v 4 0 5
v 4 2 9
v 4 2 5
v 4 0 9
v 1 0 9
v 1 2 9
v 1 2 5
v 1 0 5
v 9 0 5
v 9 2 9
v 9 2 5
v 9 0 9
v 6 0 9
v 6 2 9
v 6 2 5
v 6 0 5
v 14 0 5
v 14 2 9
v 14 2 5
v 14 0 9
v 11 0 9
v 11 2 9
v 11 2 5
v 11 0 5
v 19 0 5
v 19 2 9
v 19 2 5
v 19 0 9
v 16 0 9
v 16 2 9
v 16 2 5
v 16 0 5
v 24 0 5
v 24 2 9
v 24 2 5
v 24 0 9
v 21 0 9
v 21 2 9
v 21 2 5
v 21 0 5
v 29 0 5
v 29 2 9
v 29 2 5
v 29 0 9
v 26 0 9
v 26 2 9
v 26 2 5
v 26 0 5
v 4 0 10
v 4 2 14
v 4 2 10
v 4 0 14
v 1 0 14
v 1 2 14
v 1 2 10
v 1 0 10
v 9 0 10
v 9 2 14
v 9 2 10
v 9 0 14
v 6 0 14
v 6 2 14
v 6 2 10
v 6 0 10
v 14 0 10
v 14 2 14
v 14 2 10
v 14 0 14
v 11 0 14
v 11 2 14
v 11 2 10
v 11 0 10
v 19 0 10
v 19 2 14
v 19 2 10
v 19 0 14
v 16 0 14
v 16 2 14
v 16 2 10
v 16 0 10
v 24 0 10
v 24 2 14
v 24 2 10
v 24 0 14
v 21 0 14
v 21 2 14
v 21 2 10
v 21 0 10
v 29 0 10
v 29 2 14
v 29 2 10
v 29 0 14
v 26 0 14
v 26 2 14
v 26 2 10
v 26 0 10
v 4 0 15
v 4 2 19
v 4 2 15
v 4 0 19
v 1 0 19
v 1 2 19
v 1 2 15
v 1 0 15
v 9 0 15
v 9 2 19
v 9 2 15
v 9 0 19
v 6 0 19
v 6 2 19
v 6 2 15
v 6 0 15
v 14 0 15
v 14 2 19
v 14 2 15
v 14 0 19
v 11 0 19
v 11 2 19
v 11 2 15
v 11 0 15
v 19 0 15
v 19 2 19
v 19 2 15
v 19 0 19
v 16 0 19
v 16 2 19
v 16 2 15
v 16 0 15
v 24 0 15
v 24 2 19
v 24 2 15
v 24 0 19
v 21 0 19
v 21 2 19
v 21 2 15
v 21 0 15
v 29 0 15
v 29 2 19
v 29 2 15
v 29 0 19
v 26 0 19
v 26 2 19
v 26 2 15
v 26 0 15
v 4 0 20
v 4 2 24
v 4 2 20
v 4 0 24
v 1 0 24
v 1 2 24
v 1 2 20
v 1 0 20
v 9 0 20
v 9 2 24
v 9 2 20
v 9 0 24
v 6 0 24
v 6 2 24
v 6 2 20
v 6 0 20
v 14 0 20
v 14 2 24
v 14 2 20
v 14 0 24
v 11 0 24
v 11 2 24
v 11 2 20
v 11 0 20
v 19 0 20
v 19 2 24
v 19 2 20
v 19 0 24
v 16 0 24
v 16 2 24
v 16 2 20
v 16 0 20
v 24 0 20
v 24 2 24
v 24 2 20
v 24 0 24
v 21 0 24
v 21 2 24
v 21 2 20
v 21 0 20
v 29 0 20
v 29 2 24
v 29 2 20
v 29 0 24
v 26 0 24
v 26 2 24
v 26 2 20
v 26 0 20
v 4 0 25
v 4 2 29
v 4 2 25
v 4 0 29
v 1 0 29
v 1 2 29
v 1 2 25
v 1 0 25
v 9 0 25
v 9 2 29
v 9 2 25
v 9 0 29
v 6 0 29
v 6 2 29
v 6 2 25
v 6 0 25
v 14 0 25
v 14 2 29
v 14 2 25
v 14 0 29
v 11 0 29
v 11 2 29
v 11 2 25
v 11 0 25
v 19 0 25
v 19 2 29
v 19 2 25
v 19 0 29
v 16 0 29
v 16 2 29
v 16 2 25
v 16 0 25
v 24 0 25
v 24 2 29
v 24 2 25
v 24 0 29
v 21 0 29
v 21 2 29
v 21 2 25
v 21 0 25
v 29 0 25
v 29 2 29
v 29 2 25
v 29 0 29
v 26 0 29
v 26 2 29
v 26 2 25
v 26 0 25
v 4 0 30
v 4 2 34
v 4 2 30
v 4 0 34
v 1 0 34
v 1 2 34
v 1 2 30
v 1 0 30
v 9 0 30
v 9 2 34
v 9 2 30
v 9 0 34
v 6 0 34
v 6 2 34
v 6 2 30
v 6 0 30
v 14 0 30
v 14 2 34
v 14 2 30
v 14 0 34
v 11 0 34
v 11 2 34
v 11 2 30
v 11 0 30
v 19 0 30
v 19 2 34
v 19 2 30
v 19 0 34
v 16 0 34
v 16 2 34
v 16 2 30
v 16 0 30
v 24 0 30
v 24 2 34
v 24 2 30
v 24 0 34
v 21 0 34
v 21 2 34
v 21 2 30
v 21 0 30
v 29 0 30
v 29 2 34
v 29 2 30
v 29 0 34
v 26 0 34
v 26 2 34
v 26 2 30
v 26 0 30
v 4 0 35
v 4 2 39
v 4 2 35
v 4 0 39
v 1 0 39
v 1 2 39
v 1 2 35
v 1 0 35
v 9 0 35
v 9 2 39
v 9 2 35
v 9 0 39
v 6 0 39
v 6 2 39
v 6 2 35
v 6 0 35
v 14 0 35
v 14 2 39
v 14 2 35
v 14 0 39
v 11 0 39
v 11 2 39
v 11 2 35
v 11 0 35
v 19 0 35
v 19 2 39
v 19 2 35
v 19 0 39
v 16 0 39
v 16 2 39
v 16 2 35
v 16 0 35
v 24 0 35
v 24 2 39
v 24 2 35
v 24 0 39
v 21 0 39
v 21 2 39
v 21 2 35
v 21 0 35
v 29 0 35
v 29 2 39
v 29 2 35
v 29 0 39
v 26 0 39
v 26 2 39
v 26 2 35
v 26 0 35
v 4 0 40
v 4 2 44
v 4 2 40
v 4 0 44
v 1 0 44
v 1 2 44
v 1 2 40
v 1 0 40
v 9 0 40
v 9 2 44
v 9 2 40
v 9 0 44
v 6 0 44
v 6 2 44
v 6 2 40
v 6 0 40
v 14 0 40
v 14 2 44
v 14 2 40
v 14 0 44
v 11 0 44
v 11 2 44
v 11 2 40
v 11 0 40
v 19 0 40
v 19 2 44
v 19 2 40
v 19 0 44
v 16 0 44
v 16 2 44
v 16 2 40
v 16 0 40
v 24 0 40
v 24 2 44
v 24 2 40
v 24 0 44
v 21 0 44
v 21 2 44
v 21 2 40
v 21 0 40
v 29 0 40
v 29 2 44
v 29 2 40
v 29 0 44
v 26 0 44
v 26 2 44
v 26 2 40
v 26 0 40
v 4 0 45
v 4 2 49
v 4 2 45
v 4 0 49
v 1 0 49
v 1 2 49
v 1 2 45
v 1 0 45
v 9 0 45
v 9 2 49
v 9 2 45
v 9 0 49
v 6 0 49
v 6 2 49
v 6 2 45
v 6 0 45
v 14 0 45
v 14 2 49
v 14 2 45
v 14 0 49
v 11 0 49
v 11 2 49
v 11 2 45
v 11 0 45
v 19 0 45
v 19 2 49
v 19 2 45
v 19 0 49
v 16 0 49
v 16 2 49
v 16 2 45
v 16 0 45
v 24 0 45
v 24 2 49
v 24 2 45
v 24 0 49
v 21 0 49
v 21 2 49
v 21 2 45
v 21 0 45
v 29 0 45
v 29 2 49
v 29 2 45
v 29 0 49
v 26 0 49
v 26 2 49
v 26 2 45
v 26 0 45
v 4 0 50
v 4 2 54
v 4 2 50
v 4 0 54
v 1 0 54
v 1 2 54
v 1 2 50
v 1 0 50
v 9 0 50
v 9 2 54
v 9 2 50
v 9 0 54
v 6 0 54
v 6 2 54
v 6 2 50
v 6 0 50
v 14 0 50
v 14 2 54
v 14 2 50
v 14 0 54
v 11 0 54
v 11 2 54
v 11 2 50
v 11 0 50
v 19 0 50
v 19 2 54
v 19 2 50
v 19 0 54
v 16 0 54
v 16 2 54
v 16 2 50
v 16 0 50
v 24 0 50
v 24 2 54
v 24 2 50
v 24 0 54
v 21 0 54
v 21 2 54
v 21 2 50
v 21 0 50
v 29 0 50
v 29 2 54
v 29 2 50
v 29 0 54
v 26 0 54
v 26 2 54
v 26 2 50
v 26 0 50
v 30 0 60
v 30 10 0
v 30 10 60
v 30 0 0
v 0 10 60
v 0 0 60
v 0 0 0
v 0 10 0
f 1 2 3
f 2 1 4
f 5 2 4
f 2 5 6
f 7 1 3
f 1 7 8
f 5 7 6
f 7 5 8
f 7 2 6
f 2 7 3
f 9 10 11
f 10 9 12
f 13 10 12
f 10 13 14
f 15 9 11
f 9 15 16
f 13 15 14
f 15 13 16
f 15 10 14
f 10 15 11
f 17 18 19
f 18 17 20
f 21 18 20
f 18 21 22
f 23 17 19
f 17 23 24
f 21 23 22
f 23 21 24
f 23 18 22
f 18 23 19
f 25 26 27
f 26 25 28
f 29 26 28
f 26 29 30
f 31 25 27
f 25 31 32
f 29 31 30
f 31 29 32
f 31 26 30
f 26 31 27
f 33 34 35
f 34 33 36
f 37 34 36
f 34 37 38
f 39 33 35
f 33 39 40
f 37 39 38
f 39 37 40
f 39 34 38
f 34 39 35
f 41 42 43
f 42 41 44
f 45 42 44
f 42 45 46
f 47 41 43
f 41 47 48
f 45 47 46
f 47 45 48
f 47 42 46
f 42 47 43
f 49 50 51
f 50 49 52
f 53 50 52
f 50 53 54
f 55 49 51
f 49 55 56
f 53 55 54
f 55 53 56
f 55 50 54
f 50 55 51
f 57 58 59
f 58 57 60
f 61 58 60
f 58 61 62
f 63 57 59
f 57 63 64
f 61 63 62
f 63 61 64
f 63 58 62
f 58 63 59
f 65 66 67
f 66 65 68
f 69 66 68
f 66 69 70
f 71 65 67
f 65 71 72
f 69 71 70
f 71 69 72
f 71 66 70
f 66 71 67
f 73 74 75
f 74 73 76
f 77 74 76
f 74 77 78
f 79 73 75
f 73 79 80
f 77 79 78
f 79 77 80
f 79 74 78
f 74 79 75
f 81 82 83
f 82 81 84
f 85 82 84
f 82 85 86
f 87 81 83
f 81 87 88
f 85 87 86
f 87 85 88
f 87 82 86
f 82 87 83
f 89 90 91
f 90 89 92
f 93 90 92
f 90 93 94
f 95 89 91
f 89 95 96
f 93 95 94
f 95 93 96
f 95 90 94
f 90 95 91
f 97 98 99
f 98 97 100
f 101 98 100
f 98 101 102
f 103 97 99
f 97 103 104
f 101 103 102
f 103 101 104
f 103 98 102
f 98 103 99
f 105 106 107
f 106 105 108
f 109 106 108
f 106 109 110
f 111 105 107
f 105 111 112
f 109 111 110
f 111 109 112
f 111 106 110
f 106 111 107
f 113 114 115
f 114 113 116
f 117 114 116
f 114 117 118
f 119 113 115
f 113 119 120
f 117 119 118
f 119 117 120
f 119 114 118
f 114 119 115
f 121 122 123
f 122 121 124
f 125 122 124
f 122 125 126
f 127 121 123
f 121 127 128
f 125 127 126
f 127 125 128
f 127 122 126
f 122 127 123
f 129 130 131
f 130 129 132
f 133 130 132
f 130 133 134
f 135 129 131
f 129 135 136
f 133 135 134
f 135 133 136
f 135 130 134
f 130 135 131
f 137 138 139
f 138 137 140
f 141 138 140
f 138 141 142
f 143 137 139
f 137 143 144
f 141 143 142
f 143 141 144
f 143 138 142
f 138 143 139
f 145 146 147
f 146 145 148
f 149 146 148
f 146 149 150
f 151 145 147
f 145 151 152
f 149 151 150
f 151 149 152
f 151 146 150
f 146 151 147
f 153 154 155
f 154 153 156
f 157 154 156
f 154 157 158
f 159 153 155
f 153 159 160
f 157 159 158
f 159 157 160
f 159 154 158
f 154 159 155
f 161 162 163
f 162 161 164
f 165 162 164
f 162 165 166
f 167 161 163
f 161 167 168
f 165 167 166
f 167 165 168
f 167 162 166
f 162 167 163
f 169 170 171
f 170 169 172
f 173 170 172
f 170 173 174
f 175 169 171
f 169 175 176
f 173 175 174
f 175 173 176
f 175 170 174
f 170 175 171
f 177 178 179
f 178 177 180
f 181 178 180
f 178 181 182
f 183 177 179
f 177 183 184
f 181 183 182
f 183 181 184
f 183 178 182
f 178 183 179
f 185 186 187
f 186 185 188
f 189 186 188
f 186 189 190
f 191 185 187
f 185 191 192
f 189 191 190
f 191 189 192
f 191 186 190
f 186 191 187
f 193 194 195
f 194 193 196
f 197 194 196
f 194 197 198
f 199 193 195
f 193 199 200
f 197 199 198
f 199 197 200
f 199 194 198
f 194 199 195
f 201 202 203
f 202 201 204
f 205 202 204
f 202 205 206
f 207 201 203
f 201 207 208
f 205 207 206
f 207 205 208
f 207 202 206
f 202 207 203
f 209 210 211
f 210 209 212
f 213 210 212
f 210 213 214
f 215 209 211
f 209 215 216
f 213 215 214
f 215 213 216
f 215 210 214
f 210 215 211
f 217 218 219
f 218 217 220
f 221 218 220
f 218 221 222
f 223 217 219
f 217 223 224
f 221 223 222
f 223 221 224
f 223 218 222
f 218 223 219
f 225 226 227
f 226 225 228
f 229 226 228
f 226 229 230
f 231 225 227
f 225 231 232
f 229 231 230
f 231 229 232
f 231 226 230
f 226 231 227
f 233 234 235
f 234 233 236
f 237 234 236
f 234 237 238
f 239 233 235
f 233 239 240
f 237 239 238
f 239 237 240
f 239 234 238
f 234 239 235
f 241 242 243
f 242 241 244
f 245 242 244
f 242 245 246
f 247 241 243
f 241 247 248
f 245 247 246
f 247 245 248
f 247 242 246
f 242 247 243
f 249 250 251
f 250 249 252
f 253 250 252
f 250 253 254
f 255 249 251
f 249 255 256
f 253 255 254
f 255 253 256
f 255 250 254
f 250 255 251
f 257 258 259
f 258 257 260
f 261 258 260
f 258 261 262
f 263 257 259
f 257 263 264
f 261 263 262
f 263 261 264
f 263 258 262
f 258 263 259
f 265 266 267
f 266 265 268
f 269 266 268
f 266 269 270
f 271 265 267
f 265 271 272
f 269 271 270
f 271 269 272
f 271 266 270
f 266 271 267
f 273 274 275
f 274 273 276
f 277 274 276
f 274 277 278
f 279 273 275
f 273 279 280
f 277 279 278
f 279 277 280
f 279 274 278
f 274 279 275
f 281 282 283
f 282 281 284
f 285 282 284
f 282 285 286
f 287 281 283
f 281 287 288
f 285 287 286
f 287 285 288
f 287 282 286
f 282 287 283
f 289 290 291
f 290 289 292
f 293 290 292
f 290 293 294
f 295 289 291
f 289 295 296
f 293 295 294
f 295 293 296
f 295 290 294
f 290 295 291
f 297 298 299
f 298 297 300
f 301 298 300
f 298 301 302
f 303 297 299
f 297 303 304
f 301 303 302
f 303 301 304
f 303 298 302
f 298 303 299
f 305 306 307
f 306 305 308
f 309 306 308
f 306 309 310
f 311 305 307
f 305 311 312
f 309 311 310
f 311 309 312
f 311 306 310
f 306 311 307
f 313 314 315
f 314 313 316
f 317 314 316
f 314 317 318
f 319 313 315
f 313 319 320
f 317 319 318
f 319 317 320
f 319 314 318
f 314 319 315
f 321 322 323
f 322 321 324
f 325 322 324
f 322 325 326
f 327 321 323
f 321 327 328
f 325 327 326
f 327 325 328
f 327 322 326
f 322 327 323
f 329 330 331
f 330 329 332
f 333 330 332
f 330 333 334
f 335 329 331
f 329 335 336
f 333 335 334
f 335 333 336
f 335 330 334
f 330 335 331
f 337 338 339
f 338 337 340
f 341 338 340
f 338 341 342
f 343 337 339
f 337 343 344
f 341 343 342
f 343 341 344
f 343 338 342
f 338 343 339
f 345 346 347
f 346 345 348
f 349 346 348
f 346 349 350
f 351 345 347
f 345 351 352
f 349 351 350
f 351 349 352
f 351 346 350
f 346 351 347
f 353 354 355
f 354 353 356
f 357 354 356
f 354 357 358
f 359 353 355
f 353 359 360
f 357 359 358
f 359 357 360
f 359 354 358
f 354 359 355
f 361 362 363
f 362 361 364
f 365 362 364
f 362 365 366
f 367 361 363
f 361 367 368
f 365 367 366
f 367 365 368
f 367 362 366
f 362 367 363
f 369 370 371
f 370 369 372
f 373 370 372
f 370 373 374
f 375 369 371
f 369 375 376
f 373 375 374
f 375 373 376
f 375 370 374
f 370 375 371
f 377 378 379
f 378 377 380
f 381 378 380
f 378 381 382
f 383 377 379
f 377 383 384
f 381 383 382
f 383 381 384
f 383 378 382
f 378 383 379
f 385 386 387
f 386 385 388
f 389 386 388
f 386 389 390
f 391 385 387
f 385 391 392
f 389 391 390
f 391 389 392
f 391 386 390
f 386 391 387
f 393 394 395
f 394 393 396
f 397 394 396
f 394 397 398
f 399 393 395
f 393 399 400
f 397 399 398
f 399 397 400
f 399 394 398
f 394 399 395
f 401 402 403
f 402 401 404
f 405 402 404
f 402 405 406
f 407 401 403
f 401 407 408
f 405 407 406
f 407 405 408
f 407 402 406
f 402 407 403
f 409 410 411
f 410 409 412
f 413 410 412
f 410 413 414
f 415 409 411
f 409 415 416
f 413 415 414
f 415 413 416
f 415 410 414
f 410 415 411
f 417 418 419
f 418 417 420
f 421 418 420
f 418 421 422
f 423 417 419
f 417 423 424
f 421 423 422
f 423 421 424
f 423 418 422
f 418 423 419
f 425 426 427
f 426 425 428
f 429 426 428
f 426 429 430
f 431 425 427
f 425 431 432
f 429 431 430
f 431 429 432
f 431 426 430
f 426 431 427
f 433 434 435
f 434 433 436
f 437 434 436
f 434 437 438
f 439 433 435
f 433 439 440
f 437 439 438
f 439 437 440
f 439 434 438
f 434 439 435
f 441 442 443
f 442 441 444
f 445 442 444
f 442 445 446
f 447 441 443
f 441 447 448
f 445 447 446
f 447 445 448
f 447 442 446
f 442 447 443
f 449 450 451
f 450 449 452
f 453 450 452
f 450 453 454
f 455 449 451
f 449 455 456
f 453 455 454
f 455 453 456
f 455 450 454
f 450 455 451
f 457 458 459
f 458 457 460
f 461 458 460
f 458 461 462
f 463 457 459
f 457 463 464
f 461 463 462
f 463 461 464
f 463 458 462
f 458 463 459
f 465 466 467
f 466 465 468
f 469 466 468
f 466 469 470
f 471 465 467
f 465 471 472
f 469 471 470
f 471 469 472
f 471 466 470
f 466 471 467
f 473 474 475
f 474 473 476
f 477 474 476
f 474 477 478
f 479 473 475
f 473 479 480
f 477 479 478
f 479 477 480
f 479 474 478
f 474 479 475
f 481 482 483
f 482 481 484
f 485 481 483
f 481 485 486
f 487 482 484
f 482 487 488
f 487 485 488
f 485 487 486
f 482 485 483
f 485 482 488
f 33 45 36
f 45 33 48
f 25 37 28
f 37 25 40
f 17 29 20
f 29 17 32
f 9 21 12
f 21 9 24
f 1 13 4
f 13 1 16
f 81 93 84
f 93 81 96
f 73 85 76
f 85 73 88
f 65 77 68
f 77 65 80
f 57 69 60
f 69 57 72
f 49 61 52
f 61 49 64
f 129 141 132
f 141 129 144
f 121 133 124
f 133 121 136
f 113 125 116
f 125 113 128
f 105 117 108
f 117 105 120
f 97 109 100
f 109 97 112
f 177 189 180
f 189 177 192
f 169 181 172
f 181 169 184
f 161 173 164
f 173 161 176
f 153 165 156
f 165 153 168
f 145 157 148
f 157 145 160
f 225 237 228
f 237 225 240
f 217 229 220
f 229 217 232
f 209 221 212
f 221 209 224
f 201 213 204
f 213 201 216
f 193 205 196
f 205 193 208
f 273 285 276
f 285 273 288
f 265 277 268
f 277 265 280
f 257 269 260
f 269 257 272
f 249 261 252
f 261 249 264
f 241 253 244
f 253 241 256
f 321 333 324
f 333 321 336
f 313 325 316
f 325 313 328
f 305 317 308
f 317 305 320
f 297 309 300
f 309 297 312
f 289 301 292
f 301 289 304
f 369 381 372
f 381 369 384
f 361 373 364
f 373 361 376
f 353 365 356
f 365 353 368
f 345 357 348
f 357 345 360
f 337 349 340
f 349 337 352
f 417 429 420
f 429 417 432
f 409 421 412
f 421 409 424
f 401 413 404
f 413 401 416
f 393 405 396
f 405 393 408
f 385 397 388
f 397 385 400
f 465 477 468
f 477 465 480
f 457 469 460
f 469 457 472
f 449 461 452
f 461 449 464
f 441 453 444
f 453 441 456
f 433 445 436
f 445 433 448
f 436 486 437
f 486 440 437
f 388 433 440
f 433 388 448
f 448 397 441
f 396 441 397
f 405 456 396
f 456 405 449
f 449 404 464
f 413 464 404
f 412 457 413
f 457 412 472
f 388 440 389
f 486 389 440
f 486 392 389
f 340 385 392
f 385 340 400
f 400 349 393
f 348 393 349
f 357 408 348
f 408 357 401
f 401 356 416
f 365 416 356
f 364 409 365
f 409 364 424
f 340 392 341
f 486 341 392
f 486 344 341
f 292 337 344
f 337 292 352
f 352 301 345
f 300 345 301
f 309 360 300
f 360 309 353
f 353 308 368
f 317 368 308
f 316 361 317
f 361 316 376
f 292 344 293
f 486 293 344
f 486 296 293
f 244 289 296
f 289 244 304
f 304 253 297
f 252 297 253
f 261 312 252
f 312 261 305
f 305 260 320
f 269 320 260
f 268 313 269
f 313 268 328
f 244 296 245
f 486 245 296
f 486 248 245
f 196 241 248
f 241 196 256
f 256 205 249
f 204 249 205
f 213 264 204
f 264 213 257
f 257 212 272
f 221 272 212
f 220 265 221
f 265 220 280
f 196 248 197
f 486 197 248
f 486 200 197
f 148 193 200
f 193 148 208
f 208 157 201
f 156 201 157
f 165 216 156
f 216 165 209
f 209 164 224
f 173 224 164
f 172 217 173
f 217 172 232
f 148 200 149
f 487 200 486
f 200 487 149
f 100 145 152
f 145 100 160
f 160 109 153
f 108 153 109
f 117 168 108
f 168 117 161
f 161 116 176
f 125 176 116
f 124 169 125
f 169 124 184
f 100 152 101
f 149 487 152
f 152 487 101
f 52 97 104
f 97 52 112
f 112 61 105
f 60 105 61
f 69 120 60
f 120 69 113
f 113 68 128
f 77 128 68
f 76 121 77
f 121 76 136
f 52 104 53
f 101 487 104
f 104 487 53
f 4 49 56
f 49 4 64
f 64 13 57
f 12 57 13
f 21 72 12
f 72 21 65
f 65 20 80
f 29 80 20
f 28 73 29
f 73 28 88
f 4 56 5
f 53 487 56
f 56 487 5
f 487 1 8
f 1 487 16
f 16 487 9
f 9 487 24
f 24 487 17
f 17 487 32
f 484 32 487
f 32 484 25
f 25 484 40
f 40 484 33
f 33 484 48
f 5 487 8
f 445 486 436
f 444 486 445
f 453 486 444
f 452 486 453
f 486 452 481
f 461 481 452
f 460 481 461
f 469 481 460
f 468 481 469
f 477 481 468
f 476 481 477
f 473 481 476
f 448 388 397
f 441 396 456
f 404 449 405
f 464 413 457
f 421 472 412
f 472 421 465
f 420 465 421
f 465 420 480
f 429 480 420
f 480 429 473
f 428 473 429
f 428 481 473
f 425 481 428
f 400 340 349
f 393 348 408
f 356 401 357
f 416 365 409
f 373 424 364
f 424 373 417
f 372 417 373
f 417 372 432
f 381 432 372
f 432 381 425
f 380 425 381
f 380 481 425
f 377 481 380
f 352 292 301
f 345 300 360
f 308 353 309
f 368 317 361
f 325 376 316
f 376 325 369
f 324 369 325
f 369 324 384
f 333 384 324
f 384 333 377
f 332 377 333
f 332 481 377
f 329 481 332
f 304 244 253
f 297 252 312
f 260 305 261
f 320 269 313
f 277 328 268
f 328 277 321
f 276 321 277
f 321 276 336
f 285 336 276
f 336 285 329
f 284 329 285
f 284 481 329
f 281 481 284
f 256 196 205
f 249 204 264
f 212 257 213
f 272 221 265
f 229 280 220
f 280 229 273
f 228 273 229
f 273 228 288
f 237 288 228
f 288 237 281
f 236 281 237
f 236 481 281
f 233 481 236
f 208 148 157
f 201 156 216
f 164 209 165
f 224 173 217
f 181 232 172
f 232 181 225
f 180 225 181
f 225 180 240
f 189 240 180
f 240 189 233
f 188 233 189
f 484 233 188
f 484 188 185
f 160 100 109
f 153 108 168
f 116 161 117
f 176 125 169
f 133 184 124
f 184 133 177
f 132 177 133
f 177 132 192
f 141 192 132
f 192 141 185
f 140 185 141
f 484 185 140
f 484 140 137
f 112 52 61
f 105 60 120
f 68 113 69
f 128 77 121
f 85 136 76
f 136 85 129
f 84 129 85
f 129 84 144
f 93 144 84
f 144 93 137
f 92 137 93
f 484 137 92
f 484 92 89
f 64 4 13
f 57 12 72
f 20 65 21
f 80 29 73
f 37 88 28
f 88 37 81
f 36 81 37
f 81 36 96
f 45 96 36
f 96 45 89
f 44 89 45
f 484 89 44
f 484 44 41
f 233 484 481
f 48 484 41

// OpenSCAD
num_rows = 10;
num_cols = 6;

building_width = num_cols*5;
building_height = num_rows*6;

difference() {
    cube([building_width, 10, building_height]);  

    for (z = [1:1:num_rows]) {
        for (x = [0:1:num_cols-1]) {
            x_pos = x*5+1;
            z_pos = z*5;
            translate([x_pos, -1, z_pos]) cube([3, 3, 4]);
        } //x loop
    } //z loop
} //difference
